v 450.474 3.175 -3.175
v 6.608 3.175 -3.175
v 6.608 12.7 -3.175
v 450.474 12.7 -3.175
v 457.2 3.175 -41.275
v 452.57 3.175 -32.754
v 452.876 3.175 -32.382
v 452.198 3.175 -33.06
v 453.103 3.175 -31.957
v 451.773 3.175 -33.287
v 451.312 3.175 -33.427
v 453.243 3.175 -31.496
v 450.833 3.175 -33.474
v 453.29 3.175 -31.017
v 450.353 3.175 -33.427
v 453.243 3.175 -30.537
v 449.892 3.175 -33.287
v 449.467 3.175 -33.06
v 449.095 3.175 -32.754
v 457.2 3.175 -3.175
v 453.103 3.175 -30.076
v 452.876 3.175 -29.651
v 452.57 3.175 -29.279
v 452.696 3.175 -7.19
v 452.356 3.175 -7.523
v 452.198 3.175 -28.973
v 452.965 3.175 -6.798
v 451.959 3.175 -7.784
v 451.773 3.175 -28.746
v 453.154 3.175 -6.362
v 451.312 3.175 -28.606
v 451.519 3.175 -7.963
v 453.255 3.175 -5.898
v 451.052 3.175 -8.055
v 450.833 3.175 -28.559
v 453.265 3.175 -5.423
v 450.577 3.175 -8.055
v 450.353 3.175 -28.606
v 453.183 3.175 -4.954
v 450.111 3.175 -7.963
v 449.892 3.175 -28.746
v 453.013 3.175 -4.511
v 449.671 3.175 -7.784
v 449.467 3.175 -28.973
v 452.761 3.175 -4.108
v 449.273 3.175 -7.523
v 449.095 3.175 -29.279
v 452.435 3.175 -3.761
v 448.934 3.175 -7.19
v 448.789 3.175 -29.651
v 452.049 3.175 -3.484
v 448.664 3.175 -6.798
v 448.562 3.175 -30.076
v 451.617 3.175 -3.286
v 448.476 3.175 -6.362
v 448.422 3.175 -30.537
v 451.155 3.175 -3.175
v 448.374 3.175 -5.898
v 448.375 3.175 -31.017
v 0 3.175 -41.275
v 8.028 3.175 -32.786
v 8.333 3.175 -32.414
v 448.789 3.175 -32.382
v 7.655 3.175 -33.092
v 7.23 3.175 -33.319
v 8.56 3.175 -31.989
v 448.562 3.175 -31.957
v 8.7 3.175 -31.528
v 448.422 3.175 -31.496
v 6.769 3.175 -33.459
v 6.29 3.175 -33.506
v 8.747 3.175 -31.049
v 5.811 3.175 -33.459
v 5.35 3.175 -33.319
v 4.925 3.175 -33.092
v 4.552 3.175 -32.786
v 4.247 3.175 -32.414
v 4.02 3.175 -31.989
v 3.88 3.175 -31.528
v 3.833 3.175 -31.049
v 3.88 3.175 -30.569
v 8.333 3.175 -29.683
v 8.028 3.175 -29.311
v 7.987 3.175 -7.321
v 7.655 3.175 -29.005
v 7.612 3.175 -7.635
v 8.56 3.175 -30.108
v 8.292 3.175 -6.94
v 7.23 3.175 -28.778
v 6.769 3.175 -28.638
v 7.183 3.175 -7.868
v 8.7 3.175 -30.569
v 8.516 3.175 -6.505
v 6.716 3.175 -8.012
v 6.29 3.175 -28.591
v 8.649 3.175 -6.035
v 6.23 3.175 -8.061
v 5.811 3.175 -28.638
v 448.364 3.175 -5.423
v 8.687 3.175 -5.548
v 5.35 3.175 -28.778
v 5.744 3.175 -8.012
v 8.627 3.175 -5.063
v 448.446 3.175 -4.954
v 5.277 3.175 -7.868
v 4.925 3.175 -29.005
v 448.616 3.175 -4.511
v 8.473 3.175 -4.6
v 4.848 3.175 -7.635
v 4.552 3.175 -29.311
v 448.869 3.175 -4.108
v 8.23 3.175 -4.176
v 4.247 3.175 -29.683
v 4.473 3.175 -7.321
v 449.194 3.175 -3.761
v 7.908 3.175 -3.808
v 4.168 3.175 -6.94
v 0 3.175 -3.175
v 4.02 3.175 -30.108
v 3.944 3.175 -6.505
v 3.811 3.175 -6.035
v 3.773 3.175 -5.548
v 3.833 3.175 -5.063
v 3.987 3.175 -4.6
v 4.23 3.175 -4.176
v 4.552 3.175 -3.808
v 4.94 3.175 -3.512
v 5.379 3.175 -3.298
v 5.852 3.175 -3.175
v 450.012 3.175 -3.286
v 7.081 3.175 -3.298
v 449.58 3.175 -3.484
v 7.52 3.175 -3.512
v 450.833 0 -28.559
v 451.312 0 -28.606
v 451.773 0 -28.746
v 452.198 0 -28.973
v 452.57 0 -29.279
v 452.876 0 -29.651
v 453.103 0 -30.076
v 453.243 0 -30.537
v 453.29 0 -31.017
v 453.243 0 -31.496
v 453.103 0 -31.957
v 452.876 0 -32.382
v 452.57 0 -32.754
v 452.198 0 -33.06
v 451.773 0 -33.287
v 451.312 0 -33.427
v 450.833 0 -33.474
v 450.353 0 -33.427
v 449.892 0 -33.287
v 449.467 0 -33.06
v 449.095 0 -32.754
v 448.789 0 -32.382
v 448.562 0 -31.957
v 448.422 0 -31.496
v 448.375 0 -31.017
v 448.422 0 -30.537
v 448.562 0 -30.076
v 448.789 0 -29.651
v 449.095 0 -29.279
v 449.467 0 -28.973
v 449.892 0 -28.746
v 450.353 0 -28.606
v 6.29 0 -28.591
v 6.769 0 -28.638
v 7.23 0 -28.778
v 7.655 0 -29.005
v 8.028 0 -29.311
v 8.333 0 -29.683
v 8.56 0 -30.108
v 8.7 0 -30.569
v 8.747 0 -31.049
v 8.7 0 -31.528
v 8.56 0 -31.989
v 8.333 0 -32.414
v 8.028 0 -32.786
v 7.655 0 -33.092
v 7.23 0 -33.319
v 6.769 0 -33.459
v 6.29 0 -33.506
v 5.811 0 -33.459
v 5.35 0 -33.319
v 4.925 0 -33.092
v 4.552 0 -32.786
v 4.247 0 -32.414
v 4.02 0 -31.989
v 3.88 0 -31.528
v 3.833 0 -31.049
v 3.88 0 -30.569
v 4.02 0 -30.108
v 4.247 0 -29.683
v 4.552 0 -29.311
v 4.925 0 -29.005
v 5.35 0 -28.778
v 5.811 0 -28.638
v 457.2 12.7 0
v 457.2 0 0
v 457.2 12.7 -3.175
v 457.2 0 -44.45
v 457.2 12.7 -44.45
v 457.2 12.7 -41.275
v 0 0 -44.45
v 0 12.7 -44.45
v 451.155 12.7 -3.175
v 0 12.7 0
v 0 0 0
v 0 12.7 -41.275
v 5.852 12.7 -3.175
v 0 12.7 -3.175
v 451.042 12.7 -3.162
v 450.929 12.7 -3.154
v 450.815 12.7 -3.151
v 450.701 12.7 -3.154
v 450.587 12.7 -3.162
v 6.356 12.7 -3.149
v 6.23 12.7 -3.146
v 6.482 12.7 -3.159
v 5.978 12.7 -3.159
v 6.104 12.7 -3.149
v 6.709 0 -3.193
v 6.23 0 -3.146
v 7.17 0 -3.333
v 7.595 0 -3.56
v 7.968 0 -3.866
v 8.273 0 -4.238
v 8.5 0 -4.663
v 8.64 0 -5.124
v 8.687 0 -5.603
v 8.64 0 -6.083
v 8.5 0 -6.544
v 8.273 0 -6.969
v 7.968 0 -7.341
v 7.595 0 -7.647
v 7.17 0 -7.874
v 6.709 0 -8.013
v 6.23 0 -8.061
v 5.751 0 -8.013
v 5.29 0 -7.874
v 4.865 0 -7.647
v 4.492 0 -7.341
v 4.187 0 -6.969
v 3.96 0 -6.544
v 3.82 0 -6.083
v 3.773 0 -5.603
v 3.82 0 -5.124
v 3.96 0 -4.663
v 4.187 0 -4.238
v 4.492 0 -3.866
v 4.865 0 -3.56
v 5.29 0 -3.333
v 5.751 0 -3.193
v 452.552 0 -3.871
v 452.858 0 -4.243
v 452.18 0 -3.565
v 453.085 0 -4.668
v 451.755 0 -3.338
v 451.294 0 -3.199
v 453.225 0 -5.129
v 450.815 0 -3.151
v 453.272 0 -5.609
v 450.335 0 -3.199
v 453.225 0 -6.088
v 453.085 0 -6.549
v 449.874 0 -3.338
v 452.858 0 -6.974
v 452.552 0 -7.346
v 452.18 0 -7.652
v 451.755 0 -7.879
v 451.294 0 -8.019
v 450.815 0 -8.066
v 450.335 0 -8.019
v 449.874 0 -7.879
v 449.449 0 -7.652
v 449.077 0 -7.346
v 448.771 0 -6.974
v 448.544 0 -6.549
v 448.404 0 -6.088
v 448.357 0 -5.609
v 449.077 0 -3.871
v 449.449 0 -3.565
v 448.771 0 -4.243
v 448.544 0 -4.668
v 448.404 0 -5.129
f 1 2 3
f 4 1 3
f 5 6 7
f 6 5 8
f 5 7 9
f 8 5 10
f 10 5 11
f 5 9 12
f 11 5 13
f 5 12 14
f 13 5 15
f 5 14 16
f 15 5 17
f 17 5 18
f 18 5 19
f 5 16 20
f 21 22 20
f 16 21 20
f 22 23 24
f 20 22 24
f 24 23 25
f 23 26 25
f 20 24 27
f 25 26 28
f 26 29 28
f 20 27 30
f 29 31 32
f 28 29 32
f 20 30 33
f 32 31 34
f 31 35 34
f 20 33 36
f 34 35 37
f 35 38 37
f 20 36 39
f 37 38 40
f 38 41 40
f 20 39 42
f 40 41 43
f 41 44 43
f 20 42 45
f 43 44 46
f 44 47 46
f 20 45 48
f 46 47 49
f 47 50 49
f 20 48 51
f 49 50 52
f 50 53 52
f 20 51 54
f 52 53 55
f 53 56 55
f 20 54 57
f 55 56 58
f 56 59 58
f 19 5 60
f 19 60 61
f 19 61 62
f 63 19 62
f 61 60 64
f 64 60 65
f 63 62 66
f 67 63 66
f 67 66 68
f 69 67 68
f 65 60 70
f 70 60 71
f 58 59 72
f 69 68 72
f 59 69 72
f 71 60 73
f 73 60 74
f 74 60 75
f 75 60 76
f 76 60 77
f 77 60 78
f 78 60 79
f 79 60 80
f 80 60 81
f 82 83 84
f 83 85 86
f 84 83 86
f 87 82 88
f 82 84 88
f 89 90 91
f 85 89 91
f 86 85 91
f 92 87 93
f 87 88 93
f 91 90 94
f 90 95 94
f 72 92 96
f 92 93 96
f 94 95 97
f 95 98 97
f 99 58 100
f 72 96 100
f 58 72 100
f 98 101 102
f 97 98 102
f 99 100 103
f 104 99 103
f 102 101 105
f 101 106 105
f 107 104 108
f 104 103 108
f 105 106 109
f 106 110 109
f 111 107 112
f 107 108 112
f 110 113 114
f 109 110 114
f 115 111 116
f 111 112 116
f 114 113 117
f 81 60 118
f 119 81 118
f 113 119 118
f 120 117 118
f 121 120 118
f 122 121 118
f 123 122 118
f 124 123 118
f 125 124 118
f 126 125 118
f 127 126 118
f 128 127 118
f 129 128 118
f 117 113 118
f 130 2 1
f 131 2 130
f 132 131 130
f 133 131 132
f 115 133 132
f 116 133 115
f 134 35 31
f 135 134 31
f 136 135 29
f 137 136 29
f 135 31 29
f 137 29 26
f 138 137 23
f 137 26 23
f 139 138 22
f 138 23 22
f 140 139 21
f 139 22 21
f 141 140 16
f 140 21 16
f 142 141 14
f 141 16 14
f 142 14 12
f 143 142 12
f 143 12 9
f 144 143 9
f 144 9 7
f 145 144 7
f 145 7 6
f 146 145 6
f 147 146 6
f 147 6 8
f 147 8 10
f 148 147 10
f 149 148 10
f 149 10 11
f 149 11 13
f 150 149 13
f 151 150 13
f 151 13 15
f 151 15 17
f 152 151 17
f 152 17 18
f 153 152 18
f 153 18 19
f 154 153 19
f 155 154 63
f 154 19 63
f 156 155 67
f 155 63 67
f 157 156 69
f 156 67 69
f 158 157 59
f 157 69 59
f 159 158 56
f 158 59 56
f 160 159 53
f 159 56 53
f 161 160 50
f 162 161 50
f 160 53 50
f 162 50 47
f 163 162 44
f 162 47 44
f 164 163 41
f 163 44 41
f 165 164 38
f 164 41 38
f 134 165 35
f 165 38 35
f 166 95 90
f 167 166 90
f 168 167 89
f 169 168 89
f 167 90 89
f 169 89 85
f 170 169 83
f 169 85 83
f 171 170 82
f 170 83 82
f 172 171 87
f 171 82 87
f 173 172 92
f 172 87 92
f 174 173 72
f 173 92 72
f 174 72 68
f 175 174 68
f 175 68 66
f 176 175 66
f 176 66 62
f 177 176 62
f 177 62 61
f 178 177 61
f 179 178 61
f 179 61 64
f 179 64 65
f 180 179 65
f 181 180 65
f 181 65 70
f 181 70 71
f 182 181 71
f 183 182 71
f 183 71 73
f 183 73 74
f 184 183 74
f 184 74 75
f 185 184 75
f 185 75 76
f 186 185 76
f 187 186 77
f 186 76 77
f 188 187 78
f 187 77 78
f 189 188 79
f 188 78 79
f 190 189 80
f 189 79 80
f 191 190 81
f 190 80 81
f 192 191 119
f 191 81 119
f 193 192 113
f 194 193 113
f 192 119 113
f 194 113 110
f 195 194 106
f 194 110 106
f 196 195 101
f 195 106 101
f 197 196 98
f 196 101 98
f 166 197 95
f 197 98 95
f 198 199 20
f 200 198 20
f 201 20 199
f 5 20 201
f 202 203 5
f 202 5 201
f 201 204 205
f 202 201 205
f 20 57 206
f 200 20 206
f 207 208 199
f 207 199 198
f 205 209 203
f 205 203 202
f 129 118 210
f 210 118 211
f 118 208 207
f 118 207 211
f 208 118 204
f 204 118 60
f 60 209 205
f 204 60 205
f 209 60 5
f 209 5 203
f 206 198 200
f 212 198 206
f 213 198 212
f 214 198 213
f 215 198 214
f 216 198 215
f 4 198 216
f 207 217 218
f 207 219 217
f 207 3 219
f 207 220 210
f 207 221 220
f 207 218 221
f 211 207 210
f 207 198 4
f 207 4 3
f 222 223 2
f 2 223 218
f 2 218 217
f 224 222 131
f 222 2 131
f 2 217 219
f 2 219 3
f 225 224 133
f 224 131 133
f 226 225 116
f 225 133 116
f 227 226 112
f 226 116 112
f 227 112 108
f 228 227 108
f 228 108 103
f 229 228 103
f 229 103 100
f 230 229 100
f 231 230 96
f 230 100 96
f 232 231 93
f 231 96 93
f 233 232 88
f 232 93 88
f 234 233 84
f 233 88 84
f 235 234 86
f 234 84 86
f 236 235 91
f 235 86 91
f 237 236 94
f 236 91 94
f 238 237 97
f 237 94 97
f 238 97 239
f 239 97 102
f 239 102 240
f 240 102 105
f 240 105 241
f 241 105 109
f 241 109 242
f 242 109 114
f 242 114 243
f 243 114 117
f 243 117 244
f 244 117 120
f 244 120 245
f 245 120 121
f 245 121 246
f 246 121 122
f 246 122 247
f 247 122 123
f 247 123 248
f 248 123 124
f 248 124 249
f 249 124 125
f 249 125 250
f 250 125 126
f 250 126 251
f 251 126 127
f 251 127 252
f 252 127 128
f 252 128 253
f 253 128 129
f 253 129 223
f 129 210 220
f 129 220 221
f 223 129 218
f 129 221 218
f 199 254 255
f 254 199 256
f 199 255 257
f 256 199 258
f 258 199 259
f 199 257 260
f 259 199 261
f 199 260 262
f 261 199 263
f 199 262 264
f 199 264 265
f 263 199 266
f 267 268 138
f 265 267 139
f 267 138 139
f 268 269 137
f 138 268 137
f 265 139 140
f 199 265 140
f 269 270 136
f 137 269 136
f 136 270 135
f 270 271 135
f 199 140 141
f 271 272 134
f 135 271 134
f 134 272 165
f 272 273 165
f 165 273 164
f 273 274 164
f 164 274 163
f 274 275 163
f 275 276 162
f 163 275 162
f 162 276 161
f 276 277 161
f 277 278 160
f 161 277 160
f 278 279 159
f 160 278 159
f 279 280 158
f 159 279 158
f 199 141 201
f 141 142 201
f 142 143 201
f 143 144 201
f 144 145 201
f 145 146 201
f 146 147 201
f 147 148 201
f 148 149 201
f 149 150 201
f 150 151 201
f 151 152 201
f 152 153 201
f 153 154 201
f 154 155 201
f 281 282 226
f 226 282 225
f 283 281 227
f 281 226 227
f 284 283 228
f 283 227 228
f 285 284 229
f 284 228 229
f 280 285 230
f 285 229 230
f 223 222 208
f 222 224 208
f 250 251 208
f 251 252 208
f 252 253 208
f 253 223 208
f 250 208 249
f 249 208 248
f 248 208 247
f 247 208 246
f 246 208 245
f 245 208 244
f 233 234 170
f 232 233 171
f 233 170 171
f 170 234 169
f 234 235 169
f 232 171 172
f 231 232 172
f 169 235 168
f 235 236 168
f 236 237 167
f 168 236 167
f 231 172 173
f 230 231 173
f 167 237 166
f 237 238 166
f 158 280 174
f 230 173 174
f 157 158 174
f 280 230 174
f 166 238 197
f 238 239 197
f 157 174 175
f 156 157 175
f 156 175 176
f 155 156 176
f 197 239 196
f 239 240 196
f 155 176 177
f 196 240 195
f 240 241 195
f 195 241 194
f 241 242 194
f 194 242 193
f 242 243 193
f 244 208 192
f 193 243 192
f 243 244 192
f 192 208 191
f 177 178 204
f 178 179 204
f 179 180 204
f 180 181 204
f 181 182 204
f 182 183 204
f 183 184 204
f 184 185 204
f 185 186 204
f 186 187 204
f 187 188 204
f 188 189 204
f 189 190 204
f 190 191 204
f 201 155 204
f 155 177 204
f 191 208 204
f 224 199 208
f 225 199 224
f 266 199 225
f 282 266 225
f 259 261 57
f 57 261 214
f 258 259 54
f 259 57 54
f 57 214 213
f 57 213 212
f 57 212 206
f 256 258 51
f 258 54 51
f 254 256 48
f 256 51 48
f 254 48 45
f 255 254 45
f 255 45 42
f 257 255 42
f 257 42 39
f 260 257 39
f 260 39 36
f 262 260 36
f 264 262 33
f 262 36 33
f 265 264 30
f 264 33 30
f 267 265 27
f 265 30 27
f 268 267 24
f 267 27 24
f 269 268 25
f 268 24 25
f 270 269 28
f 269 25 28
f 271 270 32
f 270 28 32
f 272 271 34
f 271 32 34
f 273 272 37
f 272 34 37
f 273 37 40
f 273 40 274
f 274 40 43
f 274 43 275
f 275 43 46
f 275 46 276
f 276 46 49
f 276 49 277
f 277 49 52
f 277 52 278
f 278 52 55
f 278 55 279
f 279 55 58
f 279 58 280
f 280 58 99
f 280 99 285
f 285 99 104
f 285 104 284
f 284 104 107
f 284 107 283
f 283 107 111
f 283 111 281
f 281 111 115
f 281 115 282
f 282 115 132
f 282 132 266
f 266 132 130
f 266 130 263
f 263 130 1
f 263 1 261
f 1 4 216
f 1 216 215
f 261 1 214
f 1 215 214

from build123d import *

# Parameters (mm, degrees)
SKETCH1_W                    = 44.45
SKETCH1_H                    = 12.7
BOSS_EXTRUDE1_DEPTH          = 457.2
SKETCH2_W                    = 38.1
SKETCH2_H                    = 9.525
CUT_EXTRUDE1_DEPTH           = 457.2
F_10_0_1935_DIAMETER_HOLE3_D = 4.9149


with BuildPart() as part:
    # Sketch1 → Boss-Extrude1 (new body)
    with BuildSketch(Plane(origin=(0, 0, 0), x_dir=(0, 0, -1), z_dir=(1, 0, 0))):
        with Locations((22.225, 6.35)):
            Rectangle(SKETCH1_W, SKETCH1_H)
    extrude(amount=BOSS_EXTRUDE1_DEPTH)

    # Sketch2 → Cut-Extrude1 (cut)
    with BuildSketch(Plane.ZY):
        with Locations((-22.225, 7.9375)):
            Rectangle(SKETCH2_W, SKETCH2_H)
    extrude(amount=-CUT_EXTRUDE1_DEPTH, mode=Mode.SUBTRACT)

    # #10 (0.1935) Diameter Hole3 (through all)
    with Locations(Plane(origin=(450.832652449, 0, -31.016622241), x_dir=(0, 0, -1), z_dir=(0, -1, 0))):
        with Locations((0, 0), (-25.407873942, -0.017970114), (0.032060561, -444.542685672), (-25.413373891, -444.602634996)):
            Hole(F_10_0_1935_DIAMETER_HOLE3_D / 2)


solid = part.part
